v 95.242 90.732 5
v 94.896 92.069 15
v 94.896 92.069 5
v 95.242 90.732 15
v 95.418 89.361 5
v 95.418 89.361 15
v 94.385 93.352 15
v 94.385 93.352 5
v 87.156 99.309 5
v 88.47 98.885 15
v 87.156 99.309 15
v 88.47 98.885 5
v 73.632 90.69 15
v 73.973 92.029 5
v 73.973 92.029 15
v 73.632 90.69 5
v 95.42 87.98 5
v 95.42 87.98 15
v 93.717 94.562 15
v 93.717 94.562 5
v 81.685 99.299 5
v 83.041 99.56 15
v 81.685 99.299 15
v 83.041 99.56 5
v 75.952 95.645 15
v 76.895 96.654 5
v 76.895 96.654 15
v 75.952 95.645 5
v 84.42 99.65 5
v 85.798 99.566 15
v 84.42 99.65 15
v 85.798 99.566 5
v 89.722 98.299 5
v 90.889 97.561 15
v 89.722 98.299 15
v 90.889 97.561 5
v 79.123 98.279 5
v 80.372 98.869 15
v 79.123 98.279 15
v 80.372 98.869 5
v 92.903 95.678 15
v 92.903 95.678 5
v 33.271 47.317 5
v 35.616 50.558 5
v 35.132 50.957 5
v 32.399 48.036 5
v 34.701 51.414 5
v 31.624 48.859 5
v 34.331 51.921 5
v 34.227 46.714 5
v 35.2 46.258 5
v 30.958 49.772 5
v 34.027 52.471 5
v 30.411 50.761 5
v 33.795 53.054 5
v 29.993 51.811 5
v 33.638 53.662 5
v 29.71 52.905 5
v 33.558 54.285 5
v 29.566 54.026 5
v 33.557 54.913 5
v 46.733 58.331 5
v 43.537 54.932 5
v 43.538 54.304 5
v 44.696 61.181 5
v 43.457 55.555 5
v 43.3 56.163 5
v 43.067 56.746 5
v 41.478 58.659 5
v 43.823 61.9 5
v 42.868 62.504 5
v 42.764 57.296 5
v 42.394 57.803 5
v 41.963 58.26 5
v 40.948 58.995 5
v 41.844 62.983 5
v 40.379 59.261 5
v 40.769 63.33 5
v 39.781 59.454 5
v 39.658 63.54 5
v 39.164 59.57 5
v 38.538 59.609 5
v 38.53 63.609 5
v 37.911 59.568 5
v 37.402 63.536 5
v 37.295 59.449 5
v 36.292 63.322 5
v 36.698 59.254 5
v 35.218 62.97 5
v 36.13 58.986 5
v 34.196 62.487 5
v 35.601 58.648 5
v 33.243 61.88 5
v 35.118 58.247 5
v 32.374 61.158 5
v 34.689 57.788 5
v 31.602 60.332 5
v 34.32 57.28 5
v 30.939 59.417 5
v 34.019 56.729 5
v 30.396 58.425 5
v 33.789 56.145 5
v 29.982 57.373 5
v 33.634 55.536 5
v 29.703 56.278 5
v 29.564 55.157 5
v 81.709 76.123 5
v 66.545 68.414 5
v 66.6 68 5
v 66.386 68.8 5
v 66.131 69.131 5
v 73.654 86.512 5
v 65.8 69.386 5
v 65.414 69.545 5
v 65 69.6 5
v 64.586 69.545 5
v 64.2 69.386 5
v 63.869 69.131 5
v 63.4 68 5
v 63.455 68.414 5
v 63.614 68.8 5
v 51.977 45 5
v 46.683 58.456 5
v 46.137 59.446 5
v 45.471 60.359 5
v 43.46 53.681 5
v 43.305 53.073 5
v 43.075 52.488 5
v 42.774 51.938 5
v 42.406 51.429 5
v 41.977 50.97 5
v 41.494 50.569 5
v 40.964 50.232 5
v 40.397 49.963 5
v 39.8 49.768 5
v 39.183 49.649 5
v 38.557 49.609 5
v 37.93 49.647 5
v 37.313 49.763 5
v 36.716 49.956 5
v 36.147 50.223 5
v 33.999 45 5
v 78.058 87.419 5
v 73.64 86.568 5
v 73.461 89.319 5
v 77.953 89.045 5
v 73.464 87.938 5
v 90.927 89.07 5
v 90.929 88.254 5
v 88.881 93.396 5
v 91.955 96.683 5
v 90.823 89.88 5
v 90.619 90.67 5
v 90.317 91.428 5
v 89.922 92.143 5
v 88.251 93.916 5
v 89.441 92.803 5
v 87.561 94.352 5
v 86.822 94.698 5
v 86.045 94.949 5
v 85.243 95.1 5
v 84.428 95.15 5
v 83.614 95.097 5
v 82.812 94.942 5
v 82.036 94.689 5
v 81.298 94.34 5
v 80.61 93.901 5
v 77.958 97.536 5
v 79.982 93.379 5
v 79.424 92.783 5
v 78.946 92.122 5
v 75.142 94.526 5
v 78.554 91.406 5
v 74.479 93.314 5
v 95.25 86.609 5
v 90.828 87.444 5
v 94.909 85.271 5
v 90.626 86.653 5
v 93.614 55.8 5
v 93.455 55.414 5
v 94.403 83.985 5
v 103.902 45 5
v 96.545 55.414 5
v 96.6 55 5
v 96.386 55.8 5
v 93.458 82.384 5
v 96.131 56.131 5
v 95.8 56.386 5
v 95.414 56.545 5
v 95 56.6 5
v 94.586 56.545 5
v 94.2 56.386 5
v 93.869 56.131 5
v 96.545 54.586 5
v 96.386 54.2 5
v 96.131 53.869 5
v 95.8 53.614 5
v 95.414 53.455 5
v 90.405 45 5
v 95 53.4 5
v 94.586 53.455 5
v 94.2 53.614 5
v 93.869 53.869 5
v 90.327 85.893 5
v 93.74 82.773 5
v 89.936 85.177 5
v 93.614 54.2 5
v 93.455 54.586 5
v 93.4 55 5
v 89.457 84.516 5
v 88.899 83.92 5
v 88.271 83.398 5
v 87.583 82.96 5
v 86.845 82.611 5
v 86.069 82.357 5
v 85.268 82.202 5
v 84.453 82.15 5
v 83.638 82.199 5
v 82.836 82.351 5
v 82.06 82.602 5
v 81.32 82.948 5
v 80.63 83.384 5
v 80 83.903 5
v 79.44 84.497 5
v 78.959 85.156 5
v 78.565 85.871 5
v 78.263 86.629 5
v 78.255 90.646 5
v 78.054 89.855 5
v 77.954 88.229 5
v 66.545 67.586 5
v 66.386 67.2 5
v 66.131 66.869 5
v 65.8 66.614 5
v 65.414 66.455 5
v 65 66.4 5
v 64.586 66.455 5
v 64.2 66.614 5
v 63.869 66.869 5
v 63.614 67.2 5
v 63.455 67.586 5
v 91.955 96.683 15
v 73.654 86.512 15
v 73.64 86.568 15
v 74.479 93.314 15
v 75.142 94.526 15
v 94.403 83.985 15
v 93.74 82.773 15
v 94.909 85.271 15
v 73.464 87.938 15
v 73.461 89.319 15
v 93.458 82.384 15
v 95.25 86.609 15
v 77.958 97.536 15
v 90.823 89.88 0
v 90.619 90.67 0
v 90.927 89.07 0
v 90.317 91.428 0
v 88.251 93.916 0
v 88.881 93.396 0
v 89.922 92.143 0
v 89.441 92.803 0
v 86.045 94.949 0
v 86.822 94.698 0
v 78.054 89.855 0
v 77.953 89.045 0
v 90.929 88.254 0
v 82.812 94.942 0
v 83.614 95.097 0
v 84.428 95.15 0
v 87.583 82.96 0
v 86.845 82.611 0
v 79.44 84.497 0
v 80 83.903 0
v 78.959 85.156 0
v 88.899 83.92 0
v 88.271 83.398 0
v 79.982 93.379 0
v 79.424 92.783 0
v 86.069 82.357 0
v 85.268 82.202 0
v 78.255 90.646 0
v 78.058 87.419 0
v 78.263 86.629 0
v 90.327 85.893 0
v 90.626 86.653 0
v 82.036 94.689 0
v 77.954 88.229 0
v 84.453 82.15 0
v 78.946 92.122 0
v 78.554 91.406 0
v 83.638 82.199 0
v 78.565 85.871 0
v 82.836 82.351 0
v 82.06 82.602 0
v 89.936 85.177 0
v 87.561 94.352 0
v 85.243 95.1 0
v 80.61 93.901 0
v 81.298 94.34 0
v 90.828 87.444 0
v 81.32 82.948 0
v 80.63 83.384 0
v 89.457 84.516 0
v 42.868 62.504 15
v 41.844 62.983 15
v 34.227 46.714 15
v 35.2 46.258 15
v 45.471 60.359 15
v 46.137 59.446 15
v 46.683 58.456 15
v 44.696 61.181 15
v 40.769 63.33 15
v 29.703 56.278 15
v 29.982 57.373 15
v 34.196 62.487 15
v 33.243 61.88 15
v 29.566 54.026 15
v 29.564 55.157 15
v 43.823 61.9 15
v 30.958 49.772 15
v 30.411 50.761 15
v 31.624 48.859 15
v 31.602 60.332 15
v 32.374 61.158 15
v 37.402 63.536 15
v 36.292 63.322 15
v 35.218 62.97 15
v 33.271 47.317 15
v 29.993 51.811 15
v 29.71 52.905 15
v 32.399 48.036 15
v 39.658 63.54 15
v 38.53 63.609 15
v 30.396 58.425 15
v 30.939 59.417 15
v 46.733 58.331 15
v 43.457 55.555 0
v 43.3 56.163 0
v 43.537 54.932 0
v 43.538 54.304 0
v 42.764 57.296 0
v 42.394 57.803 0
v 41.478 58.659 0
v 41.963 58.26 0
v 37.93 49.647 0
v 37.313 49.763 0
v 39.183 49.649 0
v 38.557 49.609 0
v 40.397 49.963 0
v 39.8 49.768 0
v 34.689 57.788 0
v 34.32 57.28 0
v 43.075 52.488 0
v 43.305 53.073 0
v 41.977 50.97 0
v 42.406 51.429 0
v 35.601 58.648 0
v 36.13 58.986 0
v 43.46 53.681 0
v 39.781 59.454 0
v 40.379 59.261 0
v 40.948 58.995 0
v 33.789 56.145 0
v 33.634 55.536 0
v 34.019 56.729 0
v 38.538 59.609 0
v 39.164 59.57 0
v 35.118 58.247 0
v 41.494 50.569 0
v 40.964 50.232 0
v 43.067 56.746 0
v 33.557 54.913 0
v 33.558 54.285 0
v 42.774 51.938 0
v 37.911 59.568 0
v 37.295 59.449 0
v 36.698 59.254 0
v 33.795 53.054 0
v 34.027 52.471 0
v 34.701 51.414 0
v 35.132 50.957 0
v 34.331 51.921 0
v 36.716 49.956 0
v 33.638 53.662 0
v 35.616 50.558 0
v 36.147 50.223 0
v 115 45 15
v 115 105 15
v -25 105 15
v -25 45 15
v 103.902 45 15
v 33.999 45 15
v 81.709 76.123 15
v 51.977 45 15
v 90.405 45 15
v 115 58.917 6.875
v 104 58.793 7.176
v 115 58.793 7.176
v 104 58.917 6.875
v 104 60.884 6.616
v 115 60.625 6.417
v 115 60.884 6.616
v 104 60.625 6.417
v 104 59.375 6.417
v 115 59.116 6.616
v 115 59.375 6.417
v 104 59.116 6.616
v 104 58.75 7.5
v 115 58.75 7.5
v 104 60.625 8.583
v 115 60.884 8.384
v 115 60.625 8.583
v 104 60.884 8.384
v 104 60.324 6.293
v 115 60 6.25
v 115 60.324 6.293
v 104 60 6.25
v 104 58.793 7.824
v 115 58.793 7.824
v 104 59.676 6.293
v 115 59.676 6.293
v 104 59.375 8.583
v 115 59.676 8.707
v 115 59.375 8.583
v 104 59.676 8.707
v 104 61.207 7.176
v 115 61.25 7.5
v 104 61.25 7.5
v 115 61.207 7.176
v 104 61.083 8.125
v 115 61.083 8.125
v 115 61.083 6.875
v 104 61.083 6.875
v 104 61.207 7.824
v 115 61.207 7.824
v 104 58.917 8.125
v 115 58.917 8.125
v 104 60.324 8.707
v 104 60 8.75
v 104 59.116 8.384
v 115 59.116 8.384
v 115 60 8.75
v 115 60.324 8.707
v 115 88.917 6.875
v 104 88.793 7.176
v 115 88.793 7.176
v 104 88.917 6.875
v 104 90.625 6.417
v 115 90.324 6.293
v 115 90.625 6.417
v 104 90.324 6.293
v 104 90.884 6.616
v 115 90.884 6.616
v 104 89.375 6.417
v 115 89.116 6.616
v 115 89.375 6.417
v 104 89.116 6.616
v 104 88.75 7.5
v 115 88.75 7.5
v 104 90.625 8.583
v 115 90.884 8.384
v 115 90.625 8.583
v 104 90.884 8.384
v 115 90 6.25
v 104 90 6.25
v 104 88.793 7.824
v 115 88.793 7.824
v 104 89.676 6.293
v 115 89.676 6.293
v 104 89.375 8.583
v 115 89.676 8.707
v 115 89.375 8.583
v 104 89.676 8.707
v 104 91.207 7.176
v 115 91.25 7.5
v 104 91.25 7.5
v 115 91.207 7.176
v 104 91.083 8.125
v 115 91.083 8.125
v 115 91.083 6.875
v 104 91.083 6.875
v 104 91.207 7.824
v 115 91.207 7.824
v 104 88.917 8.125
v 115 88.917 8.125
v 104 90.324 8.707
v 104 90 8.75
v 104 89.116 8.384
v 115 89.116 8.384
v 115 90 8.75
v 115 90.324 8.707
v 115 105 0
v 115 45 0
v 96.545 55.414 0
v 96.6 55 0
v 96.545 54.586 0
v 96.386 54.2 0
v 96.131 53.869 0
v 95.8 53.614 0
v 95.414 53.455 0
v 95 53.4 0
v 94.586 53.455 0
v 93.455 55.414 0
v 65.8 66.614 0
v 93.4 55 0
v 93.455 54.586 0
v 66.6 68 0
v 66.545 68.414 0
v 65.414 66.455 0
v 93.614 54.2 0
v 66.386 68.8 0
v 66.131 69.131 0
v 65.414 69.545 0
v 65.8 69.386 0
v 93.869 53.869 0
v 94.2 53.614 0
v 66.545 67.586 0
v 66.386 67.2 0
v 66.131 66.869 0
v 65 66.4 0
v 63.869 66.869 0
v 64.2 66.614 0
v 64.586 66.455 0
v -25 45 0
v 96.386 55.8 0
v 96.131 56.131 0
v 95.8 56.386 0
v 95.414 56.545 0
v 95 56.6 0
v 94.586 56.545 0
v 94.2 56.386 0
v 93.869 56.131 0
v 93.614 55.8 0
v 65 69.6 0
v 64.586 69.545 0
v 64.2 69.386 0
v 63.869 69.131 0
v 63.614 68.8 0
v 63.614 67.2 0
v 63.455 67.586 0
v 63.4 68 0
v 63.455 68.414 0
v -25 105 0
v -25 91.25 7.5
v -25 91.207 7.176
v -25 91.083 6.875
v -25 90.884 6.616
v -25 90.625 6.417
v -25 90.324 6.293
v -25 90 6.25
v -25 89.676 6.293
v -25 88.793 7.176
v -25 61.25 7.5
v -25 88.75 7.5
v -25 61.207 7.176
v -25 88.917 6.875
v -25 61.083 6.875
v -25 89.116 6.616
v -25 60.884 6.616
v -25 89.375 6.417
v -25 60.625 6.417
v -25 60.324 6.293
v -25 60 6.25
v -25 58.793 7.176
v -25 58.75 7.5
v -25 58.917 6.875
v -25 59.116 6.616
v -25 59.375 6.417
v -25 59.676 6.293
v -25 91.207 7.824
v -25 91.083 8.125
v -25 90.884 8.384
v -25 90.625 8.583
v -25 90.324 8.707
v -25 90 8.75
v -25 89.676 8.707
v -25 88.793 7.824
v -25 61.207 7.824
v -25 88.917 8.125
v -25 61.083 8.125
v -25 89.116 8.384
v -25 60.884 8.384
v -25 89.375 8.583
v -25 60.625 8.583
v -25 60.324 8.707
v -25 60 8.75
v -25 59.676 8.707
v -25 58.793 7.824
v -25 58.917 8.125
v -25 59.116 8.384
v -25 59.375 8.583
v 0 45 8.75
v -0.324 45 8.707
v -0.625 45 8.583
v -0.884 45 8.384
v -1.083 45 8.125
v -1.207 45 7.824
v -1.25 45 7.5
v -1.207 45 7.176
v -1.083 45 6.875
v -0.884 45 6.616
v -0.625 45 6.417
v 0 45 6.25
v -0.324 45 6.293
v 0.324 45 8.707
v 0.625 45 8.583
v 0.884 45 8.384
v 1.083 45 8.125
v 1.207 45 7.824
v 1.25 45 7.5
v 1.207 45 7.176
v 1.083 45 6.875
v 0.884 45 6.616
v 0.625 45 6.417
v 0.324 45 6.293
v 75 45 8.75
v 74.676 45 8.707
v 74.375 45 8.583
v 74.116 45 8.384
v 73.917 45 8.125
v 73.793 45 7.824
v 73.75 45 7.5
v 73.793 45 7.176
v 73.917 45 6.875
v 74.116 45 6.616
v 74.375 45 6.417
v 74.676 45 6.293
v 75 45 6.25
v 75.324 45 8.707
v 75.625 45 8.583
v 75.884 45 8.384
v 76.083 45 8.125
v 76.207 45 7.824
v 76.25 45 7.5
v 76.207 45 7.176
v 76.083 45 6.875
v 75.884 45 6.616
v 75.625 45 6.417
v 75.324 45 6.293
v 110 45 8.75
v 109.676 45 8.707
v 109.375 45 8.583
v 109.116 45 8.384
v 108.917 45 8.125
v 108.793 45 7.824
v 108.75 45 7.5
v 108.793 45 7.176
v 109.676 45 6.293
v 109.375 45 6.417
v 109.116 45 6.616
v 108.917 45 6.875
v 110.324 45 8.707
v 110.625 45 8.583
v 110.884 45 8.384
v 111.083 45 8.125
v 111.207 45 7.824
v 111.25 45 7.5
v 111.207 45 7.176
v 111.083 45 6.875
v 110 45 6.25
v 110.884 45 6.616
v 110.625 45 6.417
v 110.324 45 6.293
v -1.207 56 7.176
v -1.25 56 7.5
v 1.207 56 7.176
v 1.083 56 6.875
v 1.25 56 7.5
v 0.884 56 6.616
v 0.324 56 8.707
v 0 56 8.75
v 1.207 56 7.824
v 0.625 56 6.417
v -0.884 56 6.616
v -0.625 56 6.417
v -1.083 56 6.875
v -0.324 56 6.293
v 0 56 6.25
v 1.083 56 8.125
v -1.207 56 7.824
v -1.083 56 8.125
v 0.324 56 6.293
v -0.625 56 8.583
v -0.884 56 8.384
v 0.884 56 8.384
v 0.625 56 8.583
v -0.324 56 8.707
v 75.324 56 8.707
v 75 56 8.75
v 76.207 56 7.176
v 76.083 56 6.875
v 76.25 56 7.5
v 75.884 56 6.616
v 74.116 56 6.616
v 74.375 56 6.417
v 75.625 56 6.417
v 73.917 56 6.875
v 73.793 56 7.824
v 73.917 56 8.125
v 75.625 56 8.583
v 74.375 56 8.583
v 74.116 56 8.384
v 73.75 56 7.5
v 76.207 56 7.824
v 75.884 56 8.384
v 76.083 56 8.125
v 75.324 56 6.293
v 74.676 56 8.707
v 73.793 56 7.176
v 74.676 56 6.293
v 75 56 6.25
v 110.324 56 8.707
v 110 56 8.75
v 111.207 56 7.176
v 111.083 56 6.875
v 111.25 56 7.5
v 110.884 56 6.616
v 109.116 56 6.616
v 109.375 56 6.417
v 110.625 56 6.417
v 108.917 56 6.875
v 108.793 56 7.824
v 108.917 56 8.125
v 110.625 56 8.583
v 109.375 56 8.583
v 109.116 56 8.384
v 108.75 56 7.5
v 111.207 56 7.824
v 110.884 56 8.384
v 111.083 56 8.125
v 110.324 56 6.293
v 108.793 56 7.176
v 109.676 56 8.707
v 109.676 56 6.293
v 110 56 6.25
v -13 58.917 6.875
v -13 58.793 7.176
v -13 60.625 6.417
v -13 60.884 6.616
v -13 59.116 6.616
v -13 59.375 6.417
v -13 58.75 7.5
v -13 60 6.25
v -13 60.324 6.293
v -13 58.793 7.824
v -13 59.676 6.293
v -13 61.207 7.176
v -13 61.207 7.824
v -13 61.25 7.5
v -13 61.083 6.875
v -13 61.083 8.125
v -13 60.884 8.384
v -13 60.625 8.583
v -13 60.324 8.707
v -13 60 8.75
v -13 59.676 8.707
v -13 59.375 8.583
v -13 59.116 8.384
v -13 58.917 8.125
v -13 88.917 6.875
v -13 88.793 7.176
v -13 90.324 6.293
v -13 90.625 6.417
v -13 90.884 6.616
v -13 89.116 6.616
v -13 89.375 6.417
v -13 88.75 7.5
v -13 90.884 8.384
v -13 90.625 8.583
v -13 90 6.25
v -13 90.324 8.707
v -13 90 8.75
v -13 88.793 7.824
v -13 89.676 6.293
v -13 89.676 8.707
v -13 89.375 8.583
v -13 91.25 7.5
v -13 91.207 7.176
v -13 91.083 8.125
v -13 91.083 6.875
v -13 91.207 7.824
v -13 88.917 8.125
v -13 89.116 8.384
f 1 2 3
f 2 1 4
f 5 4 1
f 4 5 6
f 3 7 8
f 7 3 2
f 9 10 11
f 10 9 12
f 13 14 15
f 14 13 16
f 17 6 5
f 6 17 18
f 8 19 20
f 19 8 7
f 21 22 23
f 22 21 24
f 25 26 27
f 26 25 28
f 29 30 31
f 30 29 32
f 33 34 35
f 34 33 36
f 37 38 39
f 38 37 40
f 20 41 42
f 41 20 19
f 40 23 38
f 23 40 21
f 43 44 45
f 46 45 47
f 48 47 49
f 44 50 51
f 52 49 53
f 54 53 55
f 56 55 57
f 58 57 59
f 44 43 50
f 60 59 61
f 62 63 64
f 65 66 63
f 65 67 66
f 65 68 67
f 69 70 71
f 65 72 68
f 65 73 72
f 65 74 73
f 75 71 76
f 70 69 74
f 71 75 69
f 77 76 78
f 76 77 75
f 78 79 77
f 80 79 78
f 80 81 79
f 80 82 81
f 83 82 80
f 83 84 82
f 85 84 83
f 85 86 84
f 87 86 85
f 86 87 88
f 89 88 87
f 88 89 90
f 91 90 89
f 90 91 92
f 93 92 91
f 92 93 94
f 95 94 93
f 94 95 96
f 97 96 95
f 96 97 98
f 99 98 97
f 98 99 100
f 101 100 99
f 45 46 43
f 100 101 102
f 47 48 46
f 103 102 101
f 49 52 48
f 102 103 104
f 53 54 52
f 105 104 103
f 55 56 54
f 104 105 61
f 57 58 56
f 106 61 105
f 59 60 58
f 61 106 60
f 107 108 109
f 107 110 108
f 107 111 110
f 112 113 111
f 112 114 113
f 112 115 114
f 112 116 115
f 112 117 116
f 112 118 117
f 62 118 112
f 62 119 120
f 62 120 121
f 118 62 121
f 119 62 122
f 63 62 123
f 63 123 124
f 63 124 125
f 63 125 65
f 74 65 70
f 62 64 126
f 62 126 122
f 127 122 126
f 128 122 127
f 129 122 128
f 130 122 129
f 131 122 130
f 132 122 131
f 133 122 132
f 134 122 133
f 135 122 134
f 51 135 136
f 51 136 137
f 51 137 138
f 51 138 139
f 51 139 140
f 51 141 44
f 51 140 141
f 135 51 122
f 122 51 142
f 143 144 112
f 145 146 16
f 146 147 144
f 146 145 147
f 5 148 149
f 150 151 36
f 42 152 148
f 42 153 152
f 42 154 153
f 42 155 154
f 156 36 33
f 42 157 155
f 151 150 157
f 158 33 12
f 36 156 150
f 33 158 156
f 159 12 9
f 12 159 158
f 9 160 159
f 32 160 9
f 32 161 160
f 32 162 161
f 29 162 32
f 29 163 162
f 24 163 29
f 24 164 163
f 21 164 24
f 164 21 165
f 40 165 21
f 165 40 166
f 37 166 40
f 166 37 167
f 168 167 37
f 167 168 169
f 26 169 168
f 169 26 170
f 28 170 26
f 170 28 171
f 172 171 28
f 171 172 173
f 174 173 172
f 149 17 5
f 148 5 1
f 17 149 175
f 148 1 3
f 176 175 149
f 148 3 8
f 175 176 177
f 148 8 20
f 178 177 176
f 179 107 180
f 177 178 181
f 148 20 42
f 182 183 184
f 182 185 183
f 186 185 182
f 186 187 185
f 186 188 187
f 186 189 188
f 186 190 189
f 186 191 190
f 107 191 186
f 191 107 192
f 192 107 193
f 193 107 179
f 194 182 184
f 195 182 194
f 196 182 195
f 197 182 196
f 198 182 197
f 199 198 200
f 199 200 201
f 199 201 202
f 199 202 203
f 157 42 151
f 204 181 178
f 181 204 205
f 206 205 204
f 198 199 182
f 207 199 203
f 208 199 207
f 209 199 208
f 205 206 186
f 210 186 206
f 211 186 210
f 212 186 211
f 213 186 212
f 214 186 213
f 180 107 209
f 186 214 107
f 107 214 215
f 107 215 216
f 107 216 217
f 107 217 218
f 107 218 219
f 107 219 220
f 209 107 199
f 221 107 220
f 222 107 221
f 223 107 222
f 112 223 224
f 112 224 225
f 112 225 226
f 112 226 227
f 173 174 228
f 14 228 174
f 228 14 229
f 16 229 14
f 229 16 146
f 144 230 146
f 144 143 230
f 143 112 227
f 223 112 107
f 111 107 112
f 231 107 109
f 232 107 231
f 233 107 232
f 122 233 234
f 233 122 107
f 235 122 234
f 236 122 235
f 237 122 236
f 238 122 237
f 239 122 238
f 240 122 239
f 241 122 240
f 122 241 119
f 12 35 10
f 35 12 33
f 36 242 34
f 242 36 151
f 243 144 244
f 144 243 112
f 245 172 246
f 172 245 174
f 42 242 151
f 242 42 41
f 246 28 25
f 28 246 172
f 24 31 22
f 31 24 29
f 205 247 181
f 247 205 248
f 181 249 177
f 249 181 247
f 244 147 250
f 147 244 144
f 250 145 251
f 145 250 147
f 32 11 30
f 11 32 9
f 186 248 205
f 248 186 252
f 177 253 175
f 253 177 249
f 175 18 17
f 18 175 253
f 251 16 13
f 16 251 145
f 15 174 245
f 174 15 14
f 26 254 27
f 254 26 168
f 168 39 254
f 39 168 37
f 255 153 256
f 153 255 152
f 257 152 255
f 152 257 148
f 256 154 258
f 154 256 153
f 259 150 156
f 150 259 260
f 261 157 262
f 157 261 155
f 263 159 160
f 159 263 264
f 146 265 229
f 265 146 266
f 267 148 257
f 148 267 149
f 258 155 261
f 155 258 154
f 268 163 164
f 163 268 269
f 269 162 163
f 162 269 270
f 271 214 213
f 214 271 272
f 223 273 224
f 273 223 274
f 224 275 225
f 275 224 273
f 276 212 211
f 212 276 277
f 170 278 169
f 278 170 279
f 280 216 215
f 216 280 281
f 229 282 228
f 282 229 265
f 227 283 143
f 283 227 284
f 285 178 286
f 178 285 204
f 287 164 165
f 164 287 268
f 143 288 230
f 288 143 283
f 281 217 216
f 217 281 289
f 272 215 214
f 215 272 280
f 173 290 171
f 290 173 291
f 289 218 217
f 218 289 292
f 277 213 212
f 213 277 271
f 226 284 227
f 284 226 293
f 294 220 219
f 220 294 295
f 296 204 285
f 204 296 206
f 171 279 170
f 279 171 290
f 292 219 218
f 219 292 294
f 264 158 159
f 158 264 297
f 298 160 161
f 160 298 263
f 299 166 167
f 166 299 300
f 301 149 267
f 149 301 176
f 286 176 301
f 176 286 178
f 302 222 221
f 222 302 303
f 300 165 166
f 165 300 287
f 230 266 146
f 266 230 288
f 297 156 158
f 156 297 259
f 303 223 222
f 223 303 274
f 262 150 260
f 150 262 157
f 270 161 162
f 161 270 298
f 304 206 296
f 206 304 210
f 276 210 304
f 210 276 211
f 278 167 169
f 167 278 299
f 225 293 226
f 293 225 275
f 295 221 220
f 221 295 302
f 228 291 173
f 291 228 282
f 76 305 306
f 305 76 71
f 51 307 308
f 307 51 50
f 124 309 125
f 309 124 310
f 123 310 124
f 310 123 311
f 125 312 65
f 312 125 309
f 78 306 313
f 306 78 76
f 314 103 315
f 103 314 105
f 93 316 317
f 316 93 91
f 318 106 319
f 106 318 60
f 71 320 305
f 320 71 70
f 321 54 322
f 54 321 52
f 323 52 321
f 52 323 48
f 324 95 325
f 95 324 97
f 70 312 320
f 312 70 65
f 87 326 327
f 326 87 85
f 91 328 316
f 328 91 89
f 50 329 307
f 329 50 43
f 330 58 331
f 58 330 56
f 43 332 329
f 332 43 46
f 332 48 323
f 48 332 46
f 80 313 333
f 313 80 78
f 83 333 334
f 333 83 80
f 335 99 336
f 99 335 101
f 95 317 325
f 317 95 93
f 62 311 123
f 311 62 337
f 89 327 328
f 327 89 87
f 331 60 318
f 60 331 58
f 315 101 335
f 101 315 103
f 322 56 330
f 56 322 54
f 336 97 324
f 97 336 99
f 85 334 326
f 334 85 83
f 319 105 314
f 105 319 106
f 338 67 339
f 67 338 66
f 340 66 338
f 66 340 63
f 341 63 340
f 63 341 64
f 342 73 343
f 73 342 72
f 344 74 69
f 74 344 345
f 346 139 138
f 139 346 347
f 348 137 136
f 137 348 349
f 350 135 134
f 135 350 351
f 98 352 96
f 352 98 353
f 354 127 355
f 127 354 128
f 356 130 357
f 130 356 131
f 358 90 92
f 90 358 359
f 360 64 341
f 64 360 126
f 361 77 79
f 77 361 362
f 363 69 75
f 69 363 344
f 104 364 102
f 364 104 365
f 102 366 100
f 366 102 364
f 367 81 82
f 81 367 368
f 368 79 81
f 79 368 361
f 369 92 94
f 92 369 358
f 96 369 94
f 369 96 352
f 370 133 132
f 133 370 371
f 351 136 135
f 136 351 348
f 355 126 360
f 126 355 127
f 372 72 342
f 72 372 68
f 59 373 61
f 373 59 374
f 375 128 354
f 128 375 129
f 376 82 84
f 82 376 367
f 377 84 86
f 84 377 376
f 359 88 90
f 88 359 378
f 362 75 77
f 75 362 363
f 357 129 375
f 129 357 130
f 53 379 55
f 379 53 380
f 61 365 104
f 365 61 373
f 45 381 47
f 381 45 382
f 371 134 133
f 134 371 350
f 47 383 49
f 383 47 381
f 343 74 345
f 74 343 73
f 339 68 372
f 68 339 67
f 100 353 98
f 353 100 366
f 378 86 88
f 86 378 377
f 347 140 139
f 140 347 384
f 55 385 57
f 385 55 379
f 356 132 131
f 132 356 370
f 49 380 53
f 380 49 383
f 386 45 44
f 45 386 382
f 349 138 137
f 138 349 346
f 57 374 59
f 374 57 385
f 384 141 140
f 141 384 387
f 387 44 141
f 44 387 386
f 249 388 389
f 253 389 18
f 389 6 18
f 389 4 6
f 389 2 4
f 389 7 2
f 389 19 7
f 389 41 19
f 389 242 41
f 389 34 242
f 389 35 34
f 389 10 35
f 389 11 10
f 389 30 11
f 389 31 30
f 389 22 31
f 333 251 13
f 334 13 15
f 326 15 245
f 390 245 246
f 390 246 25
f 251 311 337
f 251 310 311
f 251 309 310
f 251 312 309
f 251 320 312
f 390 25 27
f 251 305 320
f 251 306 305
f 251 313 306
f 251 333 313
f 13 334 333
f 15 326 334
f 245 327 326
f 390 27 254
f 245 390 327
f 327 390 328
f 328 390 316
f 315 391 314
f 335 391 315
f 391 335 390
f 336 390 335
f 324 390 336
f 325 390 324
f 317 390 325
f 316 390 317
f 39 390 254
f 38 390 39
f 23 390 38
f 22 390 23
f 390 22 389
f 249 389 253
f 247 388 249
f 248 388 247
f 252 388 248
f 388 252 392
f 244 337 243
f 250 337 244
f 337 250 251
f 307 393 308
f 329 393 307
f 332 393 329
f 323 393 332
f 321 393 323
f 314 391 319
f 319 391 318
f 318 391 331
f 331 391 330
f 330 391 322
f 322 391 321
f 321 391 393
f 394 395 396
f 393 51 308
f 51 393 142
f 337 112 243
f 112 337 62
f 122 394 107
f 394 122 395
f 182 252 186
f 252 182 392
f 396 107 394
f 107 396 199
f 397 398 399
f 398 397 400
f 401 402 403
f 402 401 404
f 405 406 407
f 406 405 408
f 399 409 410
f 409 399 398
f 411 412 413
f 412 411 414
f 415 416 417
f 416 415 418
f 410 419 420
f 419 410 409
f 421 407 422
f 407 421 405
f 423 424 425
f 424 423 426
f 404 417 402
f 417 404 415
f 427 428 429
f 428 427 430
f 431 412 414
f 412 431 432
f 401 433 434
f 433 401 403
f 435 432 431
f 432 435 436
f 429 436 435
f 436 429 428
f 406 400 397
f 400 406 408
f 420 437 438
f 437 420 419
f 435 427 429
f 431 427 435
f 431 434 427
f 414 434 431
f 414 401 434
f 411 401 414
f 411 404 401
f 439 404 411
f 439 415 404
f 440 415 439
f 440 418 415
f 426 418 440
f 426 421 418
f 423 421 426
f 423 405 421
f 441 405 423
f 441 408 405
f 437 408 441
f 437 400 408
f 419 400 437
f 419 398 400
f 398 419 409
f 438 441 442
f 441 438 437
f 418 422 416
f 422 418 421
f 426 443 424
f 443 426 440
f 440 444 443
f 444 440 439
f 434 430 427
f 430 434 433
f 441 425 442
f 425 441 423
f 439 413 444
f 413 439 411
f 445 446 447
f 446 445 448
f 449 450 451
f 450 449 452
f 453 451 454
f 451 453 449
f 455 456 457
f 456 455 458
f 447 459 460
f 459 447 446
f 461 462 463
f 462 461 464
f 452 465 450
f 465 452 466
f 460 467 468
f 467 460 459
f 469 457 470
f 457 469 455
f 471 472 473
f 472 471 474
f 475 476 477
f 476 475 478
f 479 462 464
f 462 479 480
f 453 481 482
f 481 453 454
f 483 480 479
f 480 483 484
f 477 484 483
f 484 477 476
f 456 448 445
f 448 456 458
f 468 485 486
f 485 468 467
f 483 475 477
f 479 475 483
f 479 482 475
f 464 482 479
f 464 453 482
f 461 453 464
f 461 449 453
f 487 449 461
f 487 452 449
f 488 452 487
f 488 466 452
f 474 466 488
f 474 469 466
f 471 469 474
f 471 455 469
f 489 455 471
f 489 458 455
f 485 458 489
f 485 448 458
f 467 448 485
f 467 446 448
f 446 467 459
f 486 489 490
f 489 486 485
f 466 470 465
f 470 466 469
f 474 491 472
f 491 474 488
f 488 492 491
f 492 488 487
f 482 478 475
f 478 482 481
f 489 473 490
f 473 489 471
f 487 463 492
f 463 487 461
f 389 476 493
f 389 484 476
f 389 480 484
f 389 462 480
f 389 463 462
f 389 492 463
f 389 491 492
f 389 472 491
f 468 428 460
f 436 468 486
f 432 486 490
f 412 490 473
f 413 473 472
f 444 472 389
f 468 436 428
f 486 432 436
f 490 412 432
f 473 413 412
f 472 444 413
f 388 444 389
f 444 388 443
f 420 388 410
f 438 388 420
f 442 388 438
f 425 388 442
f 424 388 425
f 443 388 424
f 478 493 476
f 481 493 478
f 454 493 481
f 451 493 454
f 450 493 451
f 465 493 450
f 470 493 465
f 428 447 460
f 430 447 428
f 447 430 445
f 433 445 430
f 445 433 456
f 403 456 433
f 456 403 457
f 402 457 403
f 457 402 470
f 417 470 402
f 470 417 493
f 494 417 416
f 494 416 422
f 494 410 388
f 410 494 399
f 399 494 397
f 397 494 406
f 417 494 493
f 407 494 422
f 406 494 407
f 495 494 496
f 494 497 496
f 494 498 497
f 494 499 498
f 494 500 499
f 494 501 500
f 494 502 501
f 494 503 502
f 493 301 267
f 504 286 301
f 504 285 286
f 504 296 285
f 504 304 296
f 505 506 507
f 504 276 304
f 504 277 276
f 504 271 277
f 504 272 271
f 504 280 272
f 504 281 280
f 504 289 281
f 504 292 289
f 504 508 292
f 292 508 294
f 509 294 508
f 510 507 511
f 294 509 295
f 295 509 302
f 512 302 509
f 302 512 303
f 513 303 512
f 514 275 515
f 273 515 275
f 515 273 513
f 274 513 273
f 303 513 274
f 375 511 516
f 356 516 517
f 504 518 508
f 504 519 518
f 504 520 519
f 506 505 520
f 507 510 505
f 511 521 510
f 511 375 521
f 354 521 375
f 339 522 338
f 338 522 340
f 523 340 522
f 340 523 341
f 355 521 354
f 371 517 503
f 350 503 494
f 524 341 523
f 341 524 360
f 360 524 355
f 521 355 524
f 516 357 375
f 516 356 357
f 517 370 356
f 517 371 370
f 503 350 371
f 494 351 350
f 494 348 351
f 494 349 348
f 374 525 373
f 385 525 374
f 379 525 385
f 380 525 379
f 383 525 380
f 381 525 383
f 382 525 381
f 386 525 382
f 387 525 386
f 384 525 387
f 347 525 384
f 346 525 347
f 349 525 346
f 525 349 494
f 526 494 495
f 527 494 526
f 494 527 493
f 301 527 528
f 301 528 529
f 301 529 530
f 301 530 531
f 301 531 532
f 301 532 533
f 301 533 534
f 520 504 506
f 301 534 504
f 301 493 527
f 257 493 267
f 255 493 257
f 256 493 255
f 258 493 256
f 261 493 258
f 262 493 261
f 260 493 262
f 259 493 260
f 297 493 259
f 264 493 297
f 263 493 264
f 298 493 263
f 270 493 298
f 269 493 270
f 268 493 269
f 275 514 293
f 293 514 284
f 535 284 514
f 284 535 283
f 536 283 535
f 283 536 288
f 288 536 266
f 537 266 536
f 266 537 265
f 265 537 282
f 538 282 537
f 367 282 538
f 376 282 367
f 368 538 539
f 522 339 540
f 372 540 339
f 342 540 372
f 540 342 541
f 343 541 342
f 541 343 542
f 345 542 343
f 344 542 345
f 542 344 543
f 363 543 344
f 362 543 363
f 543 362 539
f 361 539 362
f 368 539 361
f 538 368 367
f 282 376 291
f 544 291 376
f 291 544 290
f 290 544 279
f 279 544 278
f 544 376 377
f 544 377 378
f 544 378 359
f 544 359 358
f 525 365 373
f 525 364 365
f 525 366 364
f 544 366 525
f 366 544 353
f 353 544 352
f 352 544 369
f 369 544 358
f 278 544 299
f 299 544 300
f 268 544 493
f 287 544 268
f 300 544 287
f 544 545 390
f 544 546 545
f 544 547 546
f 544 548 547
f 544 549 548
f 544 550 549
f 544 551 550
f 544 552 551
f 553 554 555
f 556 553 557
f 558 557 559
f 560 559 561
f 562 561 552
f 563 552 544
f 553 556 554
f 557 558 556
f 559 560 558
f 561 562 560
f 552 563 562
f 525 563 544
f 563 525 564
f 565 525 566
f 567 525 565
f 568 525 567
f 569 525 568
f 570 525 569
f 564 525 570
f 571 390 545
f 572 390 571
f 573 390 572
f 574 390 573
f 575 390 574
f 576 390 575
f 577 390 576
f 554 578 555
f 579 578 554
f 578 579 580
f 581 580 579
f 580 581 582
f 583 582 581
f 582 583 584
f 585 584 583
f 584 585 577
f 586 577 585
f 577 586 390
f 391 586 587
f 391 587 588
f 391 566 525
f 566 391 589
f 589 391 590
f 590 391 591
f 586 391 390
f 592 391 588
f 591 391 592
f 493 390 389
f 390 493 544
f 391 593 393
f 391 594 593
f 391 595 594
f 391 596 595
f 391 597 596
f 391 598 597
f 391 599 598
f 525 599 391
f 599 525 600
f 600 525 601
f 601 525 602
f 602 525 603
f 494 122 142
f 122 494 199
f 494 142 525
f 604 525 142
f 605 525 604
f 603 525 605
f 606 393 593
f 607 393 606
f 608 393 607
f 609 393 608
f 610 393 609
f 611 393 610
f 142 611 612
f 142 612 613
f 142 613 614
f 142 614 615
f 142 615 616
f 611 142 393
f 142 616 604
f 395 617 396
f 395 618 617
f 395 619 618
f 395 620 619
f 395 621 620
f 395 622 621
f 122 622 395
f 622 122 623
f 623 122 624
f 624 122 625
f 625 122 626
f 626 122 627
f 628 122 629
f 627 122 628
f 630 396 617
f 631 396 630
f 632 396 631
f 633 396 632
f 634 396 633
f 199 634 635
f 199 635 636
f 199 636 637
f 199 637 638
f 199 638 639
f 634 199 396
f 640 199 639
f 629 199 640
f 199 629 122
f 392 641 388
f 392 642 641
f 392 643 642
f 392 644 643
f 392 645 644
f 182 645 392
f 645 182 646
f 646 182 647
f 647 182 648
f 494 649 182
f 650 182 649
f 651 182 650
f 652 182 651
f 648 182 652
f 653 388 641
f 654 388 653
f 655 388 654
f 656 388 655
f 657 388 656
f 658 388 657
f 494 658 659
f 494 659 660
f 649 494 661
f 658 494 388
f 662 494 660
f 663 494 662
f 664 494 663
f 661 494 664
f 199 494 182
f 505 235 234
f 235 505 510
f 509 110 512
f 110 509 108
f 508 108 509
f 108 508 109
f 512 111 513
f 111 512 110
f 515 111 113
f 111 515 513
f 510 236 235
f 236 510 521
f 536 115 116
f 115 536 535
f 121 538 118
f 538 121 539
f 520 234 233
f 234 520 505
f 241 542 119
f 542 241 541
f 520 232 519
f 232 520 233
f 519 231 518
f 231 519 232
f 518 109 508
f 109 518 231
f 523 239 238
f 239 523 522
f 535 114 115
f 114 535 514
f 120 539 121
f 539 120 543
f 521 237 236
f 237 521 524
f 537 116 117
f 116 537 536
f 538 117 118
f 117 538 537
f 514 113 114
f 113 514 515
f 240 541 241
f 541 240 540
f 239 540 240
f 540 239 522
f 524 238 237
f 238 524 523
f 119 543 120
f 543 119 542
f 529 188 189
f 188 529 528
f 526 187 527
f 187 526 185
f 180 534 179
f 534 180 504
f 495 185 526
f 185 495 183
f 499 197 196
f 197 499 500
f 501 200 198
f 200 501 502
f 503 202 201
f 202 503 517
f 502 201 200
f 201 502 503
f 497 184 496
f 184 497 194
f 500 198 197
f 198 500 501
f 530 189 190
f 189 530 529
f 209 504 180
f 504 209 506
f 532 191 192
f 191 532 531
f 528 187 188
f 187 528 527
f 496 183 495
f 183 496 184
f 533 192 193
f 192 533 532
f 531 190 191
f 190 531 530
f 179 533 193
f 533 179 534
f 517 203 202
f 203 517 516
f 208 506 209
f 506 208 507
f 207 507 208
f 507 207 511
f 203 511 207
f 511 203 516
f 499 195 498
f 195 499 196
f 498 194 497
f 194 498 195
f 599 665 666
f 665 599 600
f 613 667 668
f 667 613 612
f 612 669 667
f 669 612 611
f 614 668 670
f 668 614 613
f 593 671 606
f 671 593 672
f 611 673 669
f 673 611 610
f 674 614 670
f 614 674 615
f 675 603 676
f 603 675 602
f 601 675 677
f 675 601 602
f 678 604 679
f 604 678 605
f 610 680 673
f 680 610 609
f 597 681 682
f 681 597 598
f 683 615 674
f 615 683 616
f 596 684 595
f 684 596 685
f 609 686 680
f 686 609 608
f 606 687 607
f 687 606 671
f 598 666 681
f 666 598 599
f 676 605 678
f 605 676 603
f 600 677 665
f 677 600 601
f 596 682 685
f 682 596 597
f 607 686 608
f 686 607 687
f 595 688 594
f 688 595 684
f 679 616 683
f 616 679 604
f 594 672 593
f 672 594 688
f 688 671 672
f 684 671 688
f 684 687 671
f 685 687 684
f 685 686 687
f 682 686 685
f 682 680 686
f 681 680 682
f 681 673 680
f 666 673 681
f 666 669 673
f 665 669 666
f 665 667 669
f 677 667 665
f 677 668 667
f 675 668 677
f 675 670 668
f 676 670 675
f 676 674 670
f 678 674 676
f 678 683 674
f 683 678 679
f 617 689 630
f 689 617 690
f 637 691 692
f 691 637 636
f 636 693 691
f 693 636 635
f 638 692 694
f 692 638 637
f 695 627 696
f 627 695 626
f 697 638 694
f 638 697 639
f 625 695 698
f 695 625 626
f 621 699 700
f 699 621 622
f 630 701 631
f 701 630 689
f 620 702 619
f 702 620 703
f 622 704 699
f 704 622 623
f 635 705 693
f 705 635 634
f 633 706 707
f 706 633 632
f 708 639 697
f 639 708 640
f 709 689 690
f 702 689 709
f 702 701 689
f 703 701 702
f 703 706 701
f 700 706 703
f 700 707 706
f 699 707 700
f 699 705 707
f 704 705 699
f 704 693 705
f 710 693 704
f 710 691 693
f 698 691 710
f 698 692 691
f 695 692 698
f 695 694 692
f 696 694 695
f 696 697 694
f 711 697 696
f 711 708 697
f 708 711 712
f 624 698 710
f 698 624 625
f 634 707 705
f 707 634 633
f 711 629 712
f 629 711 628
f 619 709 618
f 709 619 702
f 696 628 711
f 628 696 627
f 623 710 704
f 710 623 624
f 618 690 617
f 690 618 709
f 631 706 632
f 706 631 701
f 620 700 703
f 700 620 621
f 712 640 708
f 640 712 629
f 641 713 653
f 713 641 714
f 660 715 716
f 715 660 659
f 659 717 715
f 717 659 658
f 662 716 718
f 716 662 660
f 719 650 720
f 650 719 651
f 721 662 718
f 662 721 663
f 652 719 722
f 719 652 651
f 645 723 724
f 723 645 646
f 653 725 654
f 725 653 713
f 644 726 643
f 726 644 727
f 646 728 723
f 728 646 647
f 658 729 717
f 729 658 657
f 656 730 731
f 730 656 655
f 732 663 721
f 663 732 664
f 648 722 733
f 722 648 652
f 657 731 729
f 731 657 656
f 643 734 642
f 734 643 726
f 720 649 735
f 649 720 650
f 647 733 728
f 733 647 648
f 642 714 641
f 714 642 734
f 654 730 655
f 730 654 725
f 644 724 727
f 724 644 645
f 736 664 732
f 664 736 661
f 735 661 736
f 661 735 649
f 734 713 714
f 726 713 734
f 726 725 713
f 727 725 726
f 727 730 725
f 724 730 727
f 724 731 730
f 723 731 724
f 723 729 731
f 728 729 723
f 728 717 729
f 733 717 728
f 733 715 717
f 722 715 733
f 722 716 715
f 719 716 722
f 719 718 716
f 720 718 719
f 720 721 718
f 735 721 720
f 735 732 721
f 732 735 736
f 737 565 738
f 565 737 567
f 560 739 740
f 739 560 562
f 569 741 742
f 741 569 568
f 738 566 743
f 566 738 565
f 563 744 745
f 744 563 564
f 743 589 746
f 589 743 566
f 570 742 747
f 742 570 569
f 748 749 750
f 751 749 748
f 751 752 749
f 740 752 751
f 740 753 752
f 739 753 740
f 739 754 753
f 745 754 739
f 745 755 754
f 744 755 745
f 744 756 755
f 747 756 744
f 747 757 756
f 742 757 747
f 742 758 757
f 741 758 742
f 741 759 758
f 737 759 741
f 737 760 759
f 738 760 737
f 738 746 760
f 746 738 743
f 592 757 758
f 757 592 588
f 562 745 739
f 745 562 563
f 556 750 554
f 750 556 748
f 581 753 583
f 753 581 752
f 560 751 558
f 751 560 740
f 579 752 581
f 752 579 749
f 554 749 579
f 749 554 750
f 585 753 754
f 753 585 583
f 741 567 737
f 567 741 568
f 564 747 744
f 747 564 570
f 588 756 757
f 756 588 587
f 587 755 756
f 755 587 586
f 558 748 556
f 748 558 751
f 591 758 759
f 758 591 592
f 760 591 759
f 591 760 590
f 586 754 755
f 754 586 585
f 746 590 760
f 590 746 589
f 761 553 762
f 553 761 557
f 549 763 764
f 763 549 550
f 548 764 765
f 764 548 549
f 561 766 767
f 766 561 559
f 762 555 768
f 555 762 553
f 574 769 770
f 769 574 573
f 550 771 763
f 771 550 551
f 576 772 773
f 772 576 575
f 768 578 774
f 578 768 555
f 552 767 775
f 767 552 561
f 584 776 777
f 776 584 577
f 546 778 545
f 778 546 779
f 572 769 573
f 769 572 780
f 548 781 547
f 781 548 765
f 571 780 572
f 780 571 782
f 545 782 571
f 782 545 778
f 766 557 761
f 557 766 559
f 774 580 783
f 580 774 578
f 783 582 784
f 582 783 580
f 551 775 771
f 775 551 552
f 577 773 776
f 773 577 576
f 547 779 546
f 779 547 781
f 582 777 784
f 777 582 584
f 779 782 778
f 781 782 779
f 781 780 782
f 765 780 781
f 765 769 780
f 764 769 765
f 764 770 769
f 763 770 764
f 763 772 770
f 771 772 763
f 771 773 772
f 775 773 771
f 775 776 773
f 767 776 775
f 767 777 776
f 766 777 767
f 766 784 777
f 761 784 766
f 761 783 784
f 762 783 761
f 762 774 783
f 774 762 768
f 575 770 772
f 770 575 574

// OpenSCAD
difference(){
    
translate([-25,45,0])cube([140,60,15]);

translate([0,0,5])rotate([0,0,3.71])
bogie();

translate([65,68,-1])cylinder(d=3.2,h=12);
translate([95,55,-1])cylinder(d=3.2,h=12);

$fn=24;

translate([0,44,7.5])
rotate([-90,0,0])cylinder(d=2.5,h=12);
translate([75,44,7.5])
rotate([-90,0,0])cylinder(d=2.5,h=12);
translate([110,44,7.5])
rotate([-90,0,0])cylinder(d=2.5,h=12);

translate([-25,60,7.5])
rotate([0,90,0])cylinder(d=2.5,h=12);
translate([-25,90,7.5])
rotate([0,90,0])cylinder(d=2.5,h=12);

translate([129,0,0]){
translate([-25,60,7.5])
rotate([0,90,0])cylinder(d=2.5,h=12);
translate([-25,90,7.5])
rotate([0,90,0])cylinder(d=2.5,h=12);
}
}

module bogie(){

scale([1,1,1]){
$fn=50;

translate([90,83,0])
union(){
cylinder(d=22,h=20);
translate([0,0,-6])cylinder(d=13,h=30);
}

translate([42,52,0])
union(){
cylinder(d=18,h=20);
translate([0,0,-6])cylinder(d=10,h=30);
}

rotate([0,0,42.6])
translate([3,-6.5,0])cube([116,13,10]);

translate([108,0,0])rotate([0,0,101.9])
translate([3,-6.5,0])cube([78,13,10]);
}

}
